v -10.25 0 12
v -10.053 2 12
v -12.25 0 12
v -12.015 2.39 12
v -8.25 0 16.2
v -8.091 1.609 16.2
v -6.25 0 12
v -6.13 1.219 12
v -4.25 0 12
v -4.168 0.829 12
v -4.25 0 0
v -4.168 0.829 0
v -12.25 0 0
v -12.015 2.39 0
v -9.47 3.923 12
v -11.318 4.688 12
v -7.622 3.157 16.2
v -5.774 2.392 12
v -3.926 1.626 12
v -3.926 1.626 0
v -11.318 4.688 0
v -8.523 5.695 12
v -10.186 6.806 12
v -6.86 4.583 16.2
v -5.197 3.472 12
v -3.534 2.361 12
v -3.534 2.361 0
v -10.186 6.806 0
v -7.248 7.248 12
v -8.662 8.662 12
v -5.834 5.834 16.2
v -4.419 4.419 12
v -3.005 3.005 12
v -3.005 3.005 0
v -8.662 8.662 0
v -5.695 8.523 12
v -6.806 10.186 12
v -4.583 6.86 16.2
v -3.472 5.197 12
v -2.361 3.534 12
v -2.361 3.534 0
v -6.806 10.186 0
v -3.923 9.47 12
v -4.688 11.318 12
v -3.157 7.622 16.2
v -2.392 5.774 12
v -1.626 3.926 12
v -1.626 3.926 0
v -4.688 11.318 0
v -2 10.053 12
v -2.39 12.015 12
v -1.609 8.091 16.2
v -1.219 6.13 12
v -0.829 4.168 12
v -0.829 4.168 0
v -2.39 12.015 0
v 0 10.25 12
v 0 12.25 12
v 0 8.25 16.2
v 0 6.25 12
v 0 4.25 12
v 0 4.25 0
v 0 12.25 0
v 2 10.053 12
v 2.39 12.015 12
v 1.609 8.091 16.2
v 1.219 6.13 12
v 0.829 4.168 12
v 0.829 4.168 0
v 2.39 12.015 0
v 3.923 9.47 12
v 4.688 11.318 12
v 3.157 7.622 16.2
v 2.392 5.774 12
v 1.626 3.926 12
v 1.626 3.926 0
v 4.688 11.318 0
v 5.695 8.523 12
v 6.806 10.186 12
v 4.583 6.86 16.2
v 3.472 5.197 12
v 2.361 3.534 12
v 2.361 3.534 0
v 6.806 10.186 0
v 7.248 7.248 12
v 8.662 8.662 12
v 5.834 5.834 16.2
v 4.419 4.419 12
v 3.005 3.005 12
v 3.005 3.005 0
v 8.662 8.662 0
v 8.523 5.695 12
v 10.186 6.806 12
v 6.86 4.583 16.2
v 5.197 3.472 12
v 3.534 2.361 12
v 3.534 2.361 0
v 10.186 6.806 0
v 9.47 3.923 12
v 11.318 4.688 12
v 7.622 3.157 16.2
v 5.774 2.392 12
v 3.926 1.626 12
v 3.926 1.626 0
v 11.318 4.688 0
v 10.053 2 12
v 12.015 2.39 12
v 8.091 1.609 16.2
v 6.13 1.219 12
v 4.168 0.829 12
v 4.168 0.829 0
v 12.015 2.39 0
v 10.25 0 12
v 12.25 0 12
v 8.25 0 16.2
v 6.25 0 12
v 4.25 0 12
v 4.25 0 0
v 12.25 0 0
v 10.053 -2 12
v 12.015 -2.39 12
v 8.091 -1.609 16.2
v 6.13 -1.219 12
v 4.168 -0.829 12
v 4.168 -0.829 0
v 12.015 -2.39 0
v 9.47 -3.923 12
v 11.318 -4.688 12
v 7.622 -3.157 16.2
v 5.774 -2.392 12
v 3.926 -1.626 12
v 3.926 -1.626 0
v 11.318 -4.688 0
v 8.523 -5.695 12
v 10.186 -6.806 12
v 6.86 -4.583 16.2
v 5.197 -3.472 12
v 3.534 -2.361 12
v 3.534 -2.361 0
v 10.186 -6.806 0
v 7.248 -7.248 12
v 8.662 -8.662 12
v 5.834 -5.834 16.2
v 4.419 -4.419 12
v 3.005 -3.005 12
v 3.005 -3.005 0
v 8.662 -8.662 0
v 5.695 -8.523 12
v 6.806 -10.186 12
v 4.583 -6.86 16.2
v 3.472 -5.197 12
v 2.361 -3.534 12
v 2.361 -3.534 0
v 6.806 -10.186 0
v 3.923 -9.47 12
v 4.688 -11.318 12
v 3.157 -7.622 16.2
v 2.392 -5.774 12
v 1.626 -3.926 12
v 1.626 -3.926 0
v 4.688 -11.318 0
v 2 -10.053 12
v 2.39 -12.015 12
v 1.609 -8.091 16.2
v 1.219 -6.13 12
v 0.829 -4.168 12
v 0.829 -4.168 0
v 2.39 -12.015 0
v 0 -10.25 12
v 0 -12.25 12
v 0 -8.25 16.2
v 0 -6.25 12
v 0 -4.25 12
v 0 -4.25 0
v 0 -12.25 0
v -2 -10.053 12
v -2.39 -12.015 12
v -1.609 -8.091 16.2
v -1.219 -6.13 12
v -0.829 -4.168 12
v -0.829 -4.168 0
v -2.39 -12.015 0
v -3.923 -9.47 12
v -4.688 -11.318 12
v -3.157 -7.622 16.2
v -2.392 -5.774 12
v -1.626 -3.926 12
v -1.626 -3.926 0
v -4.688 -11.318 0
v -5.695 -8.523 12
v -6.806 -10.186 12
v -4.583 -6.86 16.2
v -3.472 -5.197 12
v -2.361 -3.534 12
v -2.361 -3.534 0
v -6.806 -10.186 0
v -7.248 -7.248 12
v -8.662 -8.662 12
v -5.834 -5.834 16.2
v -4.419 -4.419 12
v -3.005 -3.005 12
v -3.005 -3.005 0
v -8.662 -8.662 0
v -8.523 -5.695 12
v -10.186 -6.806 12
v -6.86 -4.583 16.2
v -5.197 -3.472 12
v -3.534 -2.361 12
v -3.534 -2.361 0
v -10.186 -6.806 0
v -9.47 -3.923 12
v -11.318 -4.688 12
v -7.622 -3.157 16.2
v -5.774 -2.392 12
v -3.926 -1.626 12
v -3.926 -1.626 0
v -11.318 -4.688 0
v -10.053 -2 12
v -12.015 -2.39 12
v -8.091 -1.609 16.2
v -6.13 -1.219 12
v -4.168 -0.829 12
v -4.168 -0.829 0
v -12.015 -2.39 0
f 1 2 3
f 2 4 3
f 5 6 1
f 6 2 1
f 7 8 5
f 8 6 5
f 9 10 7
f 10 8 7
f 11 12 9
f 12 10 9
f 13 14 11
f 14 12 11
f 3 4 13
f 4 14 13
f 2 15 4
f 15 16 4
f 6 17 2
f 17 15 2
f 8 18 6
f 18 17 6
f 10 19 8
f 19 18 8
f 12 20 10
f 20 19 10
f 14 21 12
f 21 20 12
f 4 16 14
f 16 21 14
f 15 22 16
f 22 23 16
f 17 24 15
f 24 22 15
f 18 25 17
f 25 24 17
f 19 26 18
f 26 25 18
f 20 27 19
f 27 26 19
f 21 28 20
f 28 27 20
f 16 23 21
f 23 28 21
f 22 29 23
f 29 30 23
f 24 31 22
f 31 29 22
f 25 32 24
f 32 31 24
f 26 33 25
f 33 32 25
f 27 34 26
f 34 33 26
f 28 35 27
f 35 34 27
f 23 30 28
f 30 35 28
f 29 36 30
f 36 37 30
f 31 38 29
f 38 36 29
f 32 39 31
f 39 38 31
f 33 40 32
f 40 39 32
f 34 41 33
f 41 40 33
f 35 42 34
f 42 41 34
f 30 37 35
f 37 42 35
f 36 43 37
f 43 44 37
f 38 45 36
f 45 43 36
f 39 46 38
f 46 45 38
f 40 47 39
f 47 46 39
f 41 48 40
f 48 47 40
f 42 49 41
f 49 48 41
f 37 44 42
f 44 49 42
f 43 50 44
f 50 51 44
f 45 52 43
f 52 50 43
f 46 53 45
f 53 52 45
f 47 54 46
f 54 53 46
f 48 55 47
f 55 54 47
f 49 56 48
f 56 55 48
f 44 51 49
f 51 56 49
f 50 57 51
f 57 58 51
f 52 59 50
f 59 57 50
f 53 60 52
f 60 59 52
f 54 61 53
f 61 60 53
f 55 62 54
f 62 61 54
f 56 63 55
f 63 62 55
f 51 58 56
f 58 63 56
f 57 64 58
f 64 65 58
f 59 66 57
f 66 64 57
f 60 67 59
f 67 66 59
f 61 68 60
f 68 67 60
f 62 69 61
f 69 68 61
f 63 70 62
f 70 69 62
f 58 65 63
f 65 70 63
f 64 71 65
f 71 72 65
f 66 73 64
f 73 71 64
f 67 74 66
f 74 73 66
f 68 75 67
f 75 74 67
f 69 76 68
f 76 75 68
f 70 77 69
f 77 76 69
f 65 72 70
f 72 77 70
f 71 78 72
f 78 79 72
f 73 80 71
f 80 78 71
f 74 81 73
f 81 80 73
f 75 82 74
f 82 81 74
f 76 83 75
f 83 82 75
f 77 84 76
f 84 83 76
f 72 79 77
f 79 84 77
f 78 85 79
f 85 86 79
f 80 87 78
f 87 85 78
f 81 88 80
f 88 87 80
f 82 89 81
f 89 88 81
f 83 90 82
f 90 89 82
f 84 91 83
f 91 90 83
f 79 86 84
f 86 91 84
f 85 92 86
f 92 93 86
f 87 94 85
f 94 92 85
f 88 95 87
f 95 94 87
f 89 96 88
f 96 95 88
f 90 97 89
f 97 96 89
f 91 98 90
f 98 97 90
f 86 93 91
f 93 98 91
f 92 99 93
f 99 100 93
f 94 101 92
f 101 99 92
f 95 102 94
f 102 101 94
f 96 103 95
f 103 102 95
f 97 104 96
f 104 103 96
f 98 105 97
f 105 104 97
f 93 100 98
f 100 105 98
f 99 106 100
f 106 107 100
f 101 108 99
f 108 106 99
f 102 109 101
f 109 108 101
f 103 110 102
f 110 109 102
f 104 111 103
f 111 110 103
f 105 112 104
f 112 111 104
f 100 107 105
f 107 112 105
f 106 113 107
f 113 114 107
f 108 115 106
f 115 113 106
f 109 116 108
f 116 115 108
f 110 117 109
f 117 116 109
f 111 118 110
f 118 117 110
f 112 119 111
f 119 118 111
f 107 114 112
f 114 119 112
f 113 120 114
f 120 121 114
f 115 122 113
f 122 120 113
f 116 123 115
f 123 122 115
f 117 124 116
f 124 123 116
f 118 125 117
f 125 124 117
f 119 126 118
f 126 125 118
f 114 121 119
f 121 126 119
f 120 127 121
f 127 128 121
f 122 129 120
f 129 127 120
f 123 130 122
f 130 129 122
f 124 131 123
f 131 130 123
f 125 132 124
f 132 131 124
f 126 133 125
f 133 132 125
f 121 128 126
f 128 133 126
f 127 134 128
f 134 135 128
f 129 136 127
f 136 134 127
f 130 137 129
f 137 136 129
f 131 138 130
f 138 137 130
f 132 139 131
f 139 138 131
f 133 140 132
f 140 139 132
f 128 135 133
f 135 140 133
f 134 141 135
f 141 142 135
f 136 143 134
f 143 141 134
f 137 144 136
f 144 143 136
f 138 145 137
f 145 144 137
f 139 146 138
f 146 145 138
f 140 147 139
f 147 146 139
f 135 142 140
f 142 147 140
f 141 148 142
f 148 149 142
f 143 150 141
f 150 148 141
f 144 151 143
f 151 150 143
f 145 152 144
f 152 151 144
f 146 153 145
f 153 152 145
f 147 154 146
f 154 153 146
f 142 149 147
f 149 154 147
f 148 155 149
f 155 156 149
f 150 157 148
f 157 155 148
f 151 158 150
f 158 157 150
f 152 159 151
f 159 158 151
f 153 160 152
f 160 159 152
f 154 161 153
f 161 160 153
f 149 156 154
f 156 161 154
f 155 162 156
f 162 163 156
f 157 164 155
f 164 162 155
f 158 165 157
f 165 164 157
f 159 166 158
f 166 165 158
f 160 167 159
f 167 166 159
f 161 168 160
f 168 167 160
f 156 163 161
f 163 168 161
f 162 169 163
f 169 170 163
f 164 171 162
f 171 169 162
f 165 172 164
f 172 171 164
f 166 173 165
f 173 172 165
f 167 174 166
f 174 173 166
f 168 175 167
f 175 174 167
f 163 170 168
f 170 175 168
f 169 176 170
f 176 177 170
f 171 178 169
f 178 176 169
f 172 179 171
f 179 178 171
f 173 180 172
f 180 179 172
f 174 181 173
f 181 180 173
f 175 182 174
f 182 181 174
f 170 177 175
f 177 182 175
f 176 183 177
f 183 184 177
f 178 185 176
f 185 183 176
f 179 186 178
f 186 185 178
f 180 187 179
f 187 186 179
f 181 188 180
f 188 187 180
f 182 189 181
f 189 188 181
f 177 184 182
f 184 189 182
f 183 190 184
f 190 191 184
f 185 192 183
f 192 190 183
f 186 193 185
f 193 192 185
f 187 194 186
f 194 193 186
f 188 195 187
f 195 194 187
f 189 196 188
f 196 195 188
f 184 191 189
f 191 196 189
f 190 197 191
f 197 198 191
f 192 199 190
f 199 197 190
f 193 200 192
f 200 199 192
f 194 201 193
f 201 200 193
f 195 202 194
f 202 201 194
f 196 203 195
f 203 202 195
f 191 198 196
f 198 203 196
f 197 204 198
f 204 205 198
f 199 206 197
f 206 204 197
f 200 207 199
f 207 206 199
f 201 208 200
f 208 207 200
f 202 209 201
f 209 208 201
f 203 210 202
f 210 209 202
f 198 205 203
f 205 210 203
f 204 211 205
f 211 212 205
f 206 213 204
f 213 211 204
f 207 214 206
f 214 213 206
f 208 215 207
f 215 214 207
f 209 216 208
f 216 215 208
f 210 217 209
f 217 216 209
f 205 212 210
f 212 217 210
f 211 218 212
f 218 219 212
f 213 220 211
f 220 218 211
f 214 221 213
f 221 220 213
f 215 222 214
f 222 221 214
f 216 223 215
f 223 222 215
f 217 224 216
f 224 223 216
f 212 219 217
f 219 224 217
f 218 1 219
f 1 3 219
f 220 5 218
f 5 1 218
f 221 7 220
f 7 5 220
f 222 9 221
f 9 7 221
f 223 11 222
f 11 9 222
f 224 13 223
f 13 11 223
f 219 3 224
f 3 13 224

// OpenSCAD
$fn = 32;

// ----------------------------------------------------------------------
// Form washer: domed washer, 24.5 mm outside, 8.5 mm bore
// ----------------------------------------------------------------------

// --- parameters (mm) ---
revolve_angle = 360;      // full turn around the Z axis
profile_points = 7;       // points of the closed outline

profile = [[4.25, 0], [12.25, 0], [12.25, 12], [10.25, 12], [8.25, 16.2], [6.25, 12], [4.25, 12]];  // single closed polygon, 7 points, counter clockwise

// --- the one profile operation ---
rotate_extrude(angle = revolve_angle) polygon(points = profile);
